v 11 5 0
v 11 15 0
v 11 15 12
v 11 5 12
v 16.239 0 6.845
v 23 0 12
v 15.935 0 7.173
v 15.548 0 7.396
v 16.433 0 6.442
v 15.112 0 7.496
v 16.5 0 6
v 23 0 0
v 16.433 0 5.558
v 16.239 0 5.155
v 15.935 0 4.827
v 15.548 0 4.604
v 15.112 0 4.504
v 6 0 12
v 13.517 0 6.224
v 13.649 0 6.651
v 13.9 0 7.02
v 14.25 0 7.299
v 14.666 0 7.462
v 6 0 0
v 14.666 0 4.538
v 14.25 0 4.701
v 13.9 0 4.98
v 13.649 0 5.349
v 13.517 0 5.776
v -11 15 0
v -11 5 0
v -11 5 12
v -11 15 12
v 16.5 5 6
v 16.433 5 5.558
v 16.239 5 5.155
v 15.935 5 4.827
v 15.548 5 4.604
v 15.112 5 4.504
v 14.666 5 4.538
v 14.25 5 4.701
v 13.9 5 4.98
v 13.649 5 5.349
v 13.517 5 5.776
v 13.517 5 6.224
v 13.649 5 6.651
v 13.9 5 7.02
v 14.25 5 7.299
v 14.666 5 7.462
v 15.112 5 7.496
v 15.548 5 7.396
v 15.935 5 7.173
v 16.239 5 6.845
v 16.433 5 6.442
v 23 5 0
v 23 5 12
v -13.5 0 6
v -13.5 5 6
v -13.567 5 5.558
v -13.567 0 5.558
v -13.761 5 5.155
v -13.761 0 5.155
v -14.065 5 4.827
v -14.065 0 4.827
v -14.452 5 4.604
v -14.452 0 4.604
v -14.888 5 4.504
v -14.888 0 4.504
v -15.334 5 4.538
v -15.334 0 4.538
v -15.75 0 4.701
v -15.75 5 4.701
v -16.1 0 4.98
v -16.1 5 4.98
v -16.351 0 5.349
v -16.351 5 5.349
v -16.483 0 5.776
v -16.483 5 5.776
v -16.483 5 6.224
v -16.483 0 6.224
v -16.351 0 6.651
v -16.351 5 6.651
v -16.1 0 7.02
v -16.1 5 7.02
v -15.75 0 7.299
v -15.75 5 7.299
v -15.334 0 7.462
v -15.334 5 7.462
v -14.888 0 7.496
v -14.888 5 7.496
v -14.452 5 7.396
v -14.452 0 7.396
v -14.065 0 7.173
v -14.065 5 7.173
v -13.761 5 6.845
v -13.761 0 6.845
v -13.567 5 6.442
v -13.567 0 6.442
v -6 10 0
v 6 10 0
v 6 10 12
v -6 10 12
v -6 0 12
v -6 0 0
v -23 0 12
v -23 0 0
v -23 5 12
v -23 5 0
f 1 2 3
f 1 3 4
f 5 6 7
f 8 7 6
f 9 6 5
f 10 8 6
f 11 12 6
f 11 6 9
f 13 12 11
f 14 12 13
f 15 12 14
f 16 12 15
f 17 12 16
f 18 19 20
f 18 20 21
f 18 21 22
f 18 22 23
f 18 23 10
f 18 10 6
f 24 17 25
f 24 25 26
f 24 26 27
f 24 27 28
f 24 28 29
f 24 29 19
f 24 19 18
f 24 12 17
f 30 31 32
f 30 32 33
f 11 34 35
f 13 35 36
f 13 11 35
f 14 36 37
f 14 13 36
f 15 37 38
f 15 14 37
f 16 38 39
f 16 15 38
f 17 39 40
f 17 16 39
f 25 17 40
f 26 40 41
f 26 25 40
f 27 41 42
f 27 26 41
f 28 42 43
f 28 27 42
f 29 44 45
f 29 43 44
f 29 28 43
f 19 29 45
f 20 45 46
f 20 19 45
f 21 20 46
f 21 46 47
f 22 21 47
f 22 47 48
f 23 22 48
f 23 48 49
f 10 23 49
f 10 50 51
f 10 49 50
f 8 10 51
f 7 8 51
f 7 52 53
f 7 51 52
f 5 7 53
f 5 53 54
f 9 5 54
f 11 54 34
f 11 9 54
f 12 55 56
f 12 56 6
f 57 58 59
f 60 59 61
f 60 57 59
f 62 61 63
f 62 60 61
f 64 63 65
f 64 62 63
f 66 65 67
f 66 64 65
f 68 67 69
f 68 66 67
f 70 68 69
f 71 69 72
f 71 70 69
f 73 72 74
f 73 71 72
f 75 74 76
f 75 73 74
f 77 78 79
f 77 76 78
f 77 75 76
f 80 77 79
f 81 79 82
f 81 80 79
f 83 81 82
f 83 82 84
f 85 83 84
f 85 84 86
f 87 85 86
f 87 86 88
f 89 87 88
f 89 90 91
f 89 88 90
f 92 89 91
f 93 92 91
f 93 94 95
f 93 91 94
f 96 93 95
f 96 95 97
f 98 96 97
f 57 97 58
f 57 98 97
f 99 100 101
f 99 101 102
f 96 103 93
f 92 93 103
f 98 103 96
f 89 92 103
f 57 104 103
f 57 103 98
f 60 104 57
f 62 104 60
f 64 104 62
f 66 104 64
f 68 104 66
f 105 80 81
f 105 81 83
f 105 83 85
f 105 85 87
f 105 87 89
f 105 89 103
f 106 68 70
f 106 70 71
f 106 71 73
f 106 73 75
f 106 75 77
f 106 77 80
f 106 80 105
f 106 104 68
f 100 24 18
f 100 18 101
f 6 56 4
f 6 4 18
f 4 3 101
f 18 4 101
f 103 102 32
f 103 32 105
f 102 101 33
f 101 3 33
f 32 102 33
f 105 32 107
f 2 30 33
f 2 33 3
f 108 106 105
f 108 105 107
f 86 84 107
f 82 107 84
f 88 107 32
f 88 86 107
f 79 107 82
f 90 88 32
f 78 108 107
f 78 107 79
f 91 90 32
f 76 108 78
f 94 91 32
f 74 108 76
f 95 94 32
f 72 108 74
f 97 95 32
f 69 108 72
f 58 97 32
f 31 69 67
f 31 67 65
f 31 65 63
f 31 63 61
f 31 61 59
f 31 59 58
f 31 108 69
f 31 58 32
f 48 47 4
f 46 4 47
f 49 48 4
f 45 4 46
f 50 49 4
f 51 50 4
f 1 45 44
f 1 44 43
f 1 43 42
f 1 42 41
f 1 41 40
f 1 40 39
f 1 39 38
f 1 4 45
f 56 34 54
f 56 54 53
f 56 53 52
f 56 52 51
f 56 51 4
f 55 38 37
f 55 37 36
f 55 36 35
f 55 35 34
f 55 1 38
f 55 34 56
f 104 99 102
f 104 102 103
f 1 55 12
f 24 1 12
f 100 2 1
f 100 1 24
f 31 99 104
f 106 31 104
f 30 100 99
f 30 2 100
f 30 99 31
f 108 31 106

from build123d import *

# Parameters (mm, degrees)
EXTRUDE_1_DEPTH         = 12
SKETCH_2_R              = 1.5
CUT_EXTRUDE3_DEPTH      = 16
CUT_EXTRUDE3_DEPTH_BACK = 10


with BuildPart() as part:
    # 草图1 → 凸台-拉伸1 (new body)
    with BuildSketch(Plane.XY):
        Polygon((-11, 15), (11, 15), (11, 5), (23, 5), (23, 0), (6, 0), (6, 10), (-6, 10), (-6, 0), (-23, 0), (-23, 5), (-11, 5), align=None)
    extrude(amount=EXTRUDE_1_DEPTH)

    # 草图2 → Cut-Extrude3 (cut, two sides)
    with BuildSketch(Plane(origin=(0, 0, 0), x_dir=(1, 0, 0), z_dir=(0, 1, 0))) as cut_extrude3_sk:
        with Locations((-15, -6)):
            Circle(SKETCH_2_R)
        with Locations((15, -6)):
            Circle(SKETCH_2_R)
    extrude(amount=CUT_EXTRUDE3_DEPTH, mode=Mode.SUBTRACT)
    extrude(cut_extrude3_sk.sketch, amount=-CUT_EXTRUDE3_DEPTH_BACK, mode=Mode.SUBTRACT)


solid = part.part
